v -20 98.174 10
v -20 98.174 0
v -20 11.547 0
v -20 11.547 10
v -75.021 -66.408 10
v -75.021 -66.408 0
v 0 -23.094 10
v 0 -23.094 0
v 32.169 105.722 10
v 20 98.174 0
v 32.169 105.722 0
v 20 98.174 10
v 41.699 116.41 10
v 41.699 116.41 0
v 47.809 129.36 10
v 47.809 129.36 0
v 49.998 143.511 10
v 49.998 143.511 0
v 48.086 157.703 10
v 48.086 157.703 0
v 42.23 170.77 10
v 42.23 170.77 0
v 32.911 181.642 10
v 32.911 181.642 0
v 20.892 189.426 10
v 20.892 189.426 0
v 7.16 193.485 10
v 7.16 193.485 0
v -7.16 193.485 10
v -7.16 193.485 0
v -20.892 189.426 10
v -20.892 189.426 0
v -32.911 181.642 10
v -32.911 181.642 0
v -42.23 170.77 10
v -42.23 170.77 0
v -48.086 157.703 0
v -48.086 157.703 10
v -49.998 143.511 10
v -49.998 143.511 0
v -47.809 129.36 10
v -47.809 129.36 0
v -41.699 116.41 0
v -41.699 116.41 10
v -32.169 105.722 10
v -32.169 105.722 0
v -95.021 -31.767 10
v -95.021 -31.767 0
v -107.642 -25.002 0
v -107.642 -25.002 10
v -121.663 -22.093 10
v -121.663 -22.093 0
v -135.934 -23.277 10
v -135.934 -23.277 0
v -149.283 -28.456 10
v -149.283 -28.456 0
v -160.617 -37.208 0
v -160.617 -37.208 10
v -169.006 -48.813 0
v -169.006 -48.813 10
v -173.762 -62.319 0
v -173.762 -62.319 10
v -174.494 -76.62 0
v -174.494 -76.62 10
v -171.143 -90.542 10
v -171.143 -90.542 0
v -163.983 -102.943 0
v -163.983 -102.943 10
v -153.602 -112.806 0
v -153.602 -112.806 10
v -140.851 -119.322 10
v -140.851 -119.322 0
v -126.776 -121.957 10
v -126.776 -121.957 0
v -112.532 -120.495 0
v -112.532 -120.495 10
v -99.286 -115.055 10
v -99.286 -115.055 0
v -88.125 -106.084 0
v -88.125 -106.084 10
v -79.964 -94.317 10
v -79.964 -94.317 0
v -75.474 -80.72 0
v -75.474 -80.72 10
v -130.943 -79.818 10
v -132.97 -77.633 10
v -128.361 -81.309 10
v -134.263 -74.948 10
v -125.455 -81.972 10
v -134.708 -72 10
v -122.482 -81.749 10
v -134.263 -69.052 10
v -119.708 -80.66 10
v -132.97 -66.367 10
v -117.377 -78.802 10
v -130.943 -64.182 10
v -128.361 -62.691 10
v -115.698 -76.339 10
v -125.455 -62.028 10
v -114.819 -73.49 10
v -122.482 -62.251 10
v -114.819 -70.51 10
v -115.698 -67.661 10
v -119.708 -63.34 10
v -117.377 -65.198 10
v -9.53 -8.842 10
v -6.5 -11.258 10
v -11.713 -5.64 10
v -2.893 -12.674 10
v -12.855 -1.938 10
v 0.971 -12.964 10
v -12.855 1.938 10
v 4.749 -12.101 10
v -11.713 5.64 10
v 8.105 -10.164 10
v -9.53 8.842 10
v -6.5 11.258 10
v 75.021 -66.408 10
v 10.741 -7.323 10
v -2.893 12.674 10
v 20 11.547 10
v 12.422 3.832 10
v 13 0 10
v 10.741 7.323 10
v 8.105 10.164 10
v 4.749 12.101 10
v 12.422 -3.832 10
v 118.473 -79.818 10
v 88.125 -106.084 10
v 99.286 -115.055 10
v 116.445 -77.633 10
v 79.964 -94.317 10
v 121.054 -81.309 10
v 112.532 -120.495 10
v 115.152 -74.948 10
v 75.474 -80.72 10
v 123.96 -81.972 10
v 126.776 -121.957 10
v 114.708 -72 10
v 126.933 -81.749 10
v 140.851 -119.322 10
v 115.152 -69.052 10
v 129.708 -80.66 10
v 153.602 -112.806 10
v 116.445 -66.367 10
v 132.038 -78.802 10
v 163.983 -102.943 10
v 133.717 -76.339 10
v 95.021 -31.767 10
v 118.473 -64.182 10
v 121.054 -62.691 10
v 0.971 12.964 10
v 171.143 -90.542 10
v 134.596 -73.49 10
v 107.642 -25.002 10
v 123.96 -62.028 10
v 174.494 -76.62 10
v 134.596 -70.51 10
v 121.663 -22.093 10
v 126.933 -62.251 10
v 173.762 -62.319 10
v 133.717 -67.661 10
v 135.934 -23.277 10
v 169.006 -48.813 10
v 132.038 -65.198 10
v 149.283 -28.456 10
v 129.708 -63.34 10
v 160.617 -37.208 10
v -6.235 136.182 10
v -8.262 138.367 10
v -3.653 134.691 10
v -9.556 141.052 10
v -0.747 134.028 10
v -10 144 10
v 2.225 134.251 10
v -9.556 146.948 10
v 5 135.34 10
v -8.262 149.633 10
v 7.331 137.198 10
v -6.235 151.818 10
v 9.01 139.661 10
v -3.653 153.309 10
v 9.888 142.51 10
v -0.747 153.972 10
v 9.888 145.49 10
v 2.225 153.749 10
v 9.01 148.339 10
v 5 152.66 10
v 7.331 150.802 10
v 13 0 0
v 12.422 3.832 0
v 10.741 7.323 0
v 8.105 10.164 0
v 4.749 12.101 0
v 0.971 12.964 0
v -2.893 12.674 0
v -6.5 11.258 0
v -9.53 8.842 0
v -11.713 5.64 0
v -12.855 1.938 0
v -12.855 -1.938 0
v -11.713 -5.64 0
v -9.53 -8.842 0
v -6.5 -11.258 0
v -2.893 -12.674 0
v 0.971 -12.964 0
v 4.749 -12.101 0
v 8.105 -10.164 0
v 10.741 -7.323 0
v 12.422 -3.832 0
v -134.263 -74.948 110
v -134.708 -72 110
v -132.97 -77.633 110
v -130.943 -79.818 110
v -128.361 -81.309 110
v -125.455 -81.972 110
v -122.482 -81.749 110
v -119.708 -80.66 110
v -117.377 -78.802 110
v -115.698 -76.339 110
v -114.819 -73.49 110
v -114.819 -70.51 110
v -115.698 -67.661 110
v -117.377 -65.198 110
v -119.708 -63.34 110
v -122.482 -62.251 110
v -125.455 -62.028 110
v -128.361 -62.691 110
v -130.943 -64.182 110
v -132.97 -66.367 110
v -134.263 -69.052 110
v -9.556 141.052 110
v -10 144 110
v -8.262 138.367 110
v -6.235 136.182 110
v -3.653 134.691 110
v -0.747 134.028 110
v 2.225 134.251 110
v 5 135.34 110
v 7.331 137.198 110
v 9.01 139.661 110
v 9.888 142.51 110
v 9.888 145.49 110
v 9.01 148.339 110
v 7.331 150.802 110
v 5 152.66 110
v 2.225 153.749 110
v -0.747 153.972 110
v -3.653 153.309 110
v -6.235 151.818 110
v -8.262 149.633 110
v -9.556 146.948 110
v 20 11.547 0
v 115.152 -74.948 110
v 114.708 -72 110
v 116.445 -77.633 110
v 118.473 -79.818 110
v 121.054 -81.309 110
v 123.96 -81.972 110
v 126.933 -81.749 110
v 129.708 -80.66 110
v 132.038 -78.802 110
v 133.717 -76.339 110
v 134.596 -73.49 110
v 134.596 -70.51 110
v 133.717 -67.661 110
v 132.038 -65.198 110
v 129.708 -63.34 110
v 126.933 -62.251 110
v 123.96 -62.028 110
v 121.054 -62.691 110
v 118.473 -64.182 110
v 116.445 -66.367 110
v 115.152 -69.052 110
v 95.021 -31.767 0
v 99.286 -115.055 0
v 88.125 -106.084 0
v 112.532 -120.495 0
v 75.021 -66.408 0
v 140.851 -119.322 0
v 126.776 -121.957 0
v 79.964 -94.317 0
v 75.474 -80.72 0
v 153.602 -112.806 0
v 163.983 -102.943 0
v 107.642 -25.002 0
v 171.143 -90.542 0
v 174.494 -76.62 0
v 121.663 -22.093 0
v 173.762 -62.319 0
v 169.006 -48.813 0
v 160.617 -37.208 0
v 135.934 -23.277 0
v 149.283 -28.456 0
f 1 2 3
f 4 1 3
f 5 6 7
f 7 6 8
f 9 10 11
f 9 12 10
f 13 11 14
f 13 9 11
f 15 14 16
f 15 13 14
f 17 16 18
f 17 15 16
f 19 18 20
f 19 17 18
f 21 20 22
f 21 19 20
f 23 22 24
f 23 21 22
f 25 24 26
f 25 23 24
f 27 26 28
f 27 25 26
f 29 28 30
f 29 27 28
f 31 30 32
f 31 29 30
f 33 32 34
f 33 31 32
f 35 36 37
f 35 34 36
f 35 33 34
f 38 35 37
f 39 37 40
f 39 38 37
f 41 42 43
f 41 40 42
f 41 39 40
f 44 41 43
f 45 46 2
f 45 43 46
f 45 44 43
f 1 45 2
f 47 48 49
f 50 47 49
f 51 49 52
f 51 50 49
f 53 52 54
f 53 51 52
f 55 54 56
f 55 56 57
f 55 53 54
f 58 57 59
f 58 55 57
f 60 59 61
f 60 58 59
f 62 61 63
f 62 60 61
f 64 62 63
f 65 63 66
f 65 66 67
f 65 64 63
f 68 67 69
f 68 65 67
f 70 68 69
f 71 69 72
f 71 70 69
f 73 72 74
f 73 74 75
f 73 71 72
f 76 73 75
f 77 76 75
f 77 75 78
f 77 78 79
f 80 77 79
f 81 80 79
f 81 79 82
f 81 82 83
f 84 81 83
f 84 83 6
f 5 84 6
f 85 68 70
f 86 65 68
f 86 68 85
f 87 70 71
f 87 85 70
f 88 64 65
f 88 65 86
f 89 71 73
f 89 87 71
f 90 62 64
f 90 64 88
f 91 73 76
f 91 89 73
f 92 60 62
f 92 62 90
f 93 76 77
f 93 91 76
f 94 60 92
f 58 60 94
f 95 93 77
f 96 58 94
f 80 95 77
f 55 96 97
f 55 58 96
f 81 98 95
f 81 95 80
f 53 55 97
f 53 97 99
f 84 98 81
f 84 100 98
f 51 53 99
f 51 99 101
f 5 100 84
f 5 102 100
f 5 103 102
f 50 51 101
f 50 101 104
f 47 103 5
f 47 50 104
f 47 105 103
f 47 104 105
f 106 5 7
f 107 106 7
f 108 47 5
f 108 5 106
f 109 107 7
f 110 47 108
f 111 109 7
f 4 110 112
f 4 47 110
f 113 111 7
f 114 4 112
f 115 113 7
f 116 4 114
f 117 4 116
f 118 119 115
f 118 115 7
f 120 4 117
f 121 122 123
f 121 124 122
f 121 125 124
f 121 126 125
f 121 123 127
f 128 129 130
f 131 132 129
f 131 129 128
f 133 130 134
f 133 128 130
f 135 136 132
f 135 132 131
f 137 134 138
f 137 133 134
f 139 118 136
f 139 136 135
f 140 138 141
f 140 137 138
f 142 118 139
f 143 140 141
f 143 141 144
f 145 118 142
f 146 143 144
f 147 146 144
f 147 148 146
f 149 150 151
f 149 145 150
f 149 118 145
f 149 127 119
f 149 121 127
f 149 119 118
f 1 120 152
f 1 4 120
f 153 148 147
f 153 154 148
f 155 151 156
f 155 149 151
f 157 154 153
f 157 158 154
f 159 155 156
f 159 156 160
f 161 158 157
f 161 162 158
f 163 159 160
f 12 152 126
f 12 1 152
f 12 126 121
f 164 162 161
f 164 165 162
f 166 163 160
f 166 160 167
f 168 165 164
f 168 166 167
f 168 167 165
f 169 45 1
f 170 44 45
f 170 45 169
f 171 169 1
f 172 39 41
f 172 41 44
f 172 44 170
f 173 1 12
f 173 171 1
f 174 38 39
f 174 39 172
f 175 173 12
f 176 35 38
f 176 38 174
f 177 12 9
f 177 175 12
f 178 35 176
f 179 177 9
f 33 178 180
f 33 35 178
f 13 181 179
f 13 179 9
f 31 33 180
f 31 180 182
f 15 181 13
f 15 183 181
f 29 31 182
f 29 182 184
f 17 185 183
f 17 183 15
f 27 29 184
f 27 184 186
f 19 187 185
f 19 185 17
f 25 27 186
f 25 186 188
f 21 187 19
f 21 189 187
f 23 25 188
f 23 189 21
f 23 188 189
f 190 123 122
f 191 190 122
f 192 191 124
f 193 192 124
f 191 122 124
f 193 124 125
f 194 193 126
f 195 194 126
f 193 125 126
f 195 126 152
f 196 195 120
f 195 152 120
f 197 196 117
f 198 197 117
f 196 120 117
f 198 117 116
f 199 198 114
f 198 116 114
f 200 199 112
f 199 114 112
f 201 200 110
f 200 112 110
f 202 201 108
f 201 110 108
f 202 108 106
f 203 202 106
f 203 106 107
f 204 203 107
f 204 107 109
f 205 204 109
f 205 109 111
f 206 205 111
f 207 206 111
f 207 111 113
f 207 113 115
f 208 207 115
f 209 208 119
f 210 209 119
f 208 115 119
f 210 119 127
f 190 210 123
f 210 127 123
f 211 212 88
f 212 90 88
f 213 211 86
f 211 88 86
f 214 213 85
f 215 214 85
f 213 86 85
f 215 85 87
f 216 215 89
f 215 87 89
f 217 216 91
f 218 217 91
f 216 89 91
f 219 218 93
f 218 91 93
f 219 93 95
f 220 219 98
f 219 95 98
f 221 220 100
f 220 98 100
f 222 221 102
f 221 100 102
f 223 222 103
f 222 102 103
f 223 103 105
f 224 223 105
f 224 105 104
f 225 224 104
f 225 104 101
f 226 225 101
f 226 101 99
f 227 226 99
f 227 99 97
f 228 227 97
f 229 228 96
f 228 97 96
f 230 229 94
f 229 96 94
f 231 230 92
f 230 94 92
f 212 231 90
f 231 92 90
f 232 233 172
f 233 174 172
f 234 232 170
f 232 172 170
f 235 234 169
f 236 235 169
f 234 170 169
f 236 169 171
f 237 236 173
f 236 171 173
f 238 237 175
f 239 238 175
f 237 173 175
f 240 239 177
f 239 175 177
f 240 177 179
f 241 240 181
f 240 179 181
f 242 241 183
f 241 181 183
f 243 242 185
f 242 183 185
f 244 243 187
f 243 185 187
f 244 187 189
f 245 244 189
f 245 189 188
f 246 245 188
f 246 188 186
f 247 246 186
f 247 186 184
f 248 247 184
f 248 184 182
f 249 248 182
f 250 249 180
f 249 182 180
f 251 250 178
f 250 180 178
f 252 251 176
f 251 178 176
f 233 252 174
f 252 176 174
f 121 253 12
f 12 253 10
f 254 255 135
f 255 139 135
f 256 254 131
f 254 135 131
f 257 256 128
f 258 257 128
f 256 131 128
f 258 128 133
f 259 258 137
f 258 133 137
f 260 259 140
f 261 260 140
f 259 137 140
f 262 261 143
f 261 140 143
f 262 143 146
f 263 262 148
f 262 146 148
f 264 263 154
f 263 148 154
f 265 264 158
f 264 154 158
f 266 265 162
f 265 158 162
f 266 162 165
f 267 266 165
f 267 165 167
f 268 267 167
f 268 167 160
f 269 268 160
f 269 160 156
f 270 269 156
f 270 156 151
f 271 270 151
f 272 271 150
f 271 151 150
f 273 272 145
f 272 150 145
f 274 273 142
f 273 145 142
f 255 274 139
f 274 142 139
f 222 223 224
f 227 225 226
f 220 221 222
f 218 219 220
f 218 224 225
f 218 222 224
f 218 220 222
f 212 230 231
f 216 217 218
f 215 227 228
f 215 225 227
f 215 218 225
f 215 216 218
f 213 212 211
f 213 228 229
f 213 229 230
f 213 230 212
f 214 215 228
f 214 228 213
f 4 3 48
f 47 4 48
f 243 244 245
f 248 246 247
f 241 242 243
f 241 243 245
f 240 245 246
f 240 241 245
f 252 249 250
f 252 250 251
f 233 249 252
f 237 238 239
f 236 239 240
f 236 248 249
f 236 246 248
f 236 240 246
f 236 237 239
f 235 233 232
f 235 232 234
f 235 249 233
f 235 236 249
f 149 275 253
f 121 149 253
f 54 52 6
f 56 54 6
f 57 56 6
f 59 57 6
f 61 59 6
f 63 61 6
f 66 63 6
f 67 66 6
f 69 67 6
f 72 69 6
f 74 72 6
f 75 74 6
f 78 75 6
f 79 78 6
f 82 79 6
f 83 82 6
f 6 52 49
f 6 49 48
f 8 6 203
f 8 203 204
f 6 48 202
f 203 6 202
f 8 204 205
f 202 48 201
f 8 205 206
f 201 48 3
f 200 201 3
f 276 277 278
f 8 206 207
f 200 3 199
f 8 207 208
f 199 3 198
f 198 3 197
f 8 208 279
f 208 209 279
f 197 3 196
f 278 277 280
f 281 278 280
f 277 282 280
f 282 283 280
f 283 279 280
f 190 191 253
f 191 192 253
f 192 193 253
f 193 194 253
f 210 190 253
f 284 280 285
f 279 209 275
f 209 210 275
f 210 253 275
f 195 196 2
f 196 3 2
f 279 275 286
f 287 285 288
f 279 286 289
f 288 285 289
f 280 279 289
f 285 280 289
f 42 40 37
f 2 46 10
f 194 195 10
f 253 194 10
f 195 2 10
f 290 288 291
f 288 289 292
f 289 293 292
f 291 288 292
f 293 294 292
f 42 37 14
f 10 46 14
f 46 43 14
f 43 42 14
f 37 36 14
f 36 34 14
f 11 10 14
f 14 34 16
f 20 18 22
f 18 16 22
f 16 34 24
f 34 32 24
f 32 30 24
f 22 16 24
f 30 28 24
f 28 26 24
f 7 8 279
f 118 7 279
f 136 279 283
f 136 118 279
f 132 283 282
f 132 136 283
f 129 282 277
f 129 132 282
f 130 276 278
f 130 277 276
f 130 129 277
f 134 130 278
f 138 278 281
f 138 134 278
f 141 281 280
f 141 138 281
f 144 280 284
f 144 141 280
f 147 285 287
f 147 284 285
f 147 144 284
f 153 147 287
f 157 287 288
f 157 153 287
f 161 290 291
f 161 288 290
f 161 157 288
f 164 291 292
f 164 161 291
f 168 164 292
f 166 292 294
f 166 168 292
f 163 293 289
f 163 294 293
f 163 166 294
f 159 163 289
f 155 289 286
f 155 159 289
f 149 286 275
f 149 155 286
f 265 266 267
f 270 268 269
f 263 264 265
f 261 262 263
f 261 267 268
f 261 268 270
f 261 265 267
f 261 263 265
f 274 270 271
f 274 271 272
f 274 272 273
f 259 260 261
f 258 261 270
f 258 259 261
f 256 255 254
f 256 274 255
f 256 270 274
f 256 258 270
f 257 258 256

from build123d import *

# Parameters (mm, degrees)
BOSS_EXTRUDE2_DEPTH = 10
SKETCH3_R           = 50
BOSS_EXTRUDE3_DEPTH = 10
SKETCH4_R           = 10
BOSS_EXTRUDE4_DEPTH = 90
CUT_EXTRUDE1_START  = -30
SKETCH5_R           = 10
CUT_EXTRUDE1_DEPTH  = 30
SKETCH6_R           = 13
CUT_EXTRUDE2_DEPTH  = 10
SKETCH7_R           = 10
BOSS_EXTRUDE5_DEPTH = 30
SKETCH9_R           = 10
BOSS_EXTRUDE6_DEPTH = 10
SKETCH10_R          = 10
BOSS_EXTRUDE7_DEPTH = 10
SKETCH11_R          = 10
BOSS_EXTRUDE8_DEPTH = 10


with BuildPart() as part:
    # Sketch1 → Boss-Extrude2 (new body)
    with BuildSketch(Plane.XY):
        Polygon((20, 144), (-20, 144), (-20, 11.547005384), (-134.707658145, -54.679491924), (-114.707658145, -89.320508076), (0, -23.094010768), (114.707658145, -89.320508076), (134.707658145, -54.679491924), (20, 11.547005384), align=None)
    extrude(amount=BOSS_EXTRUDE2_DEPTH)

    # Sketch3 → Boss-Extrude3 (add)
    with BuildSketch(Plane.XY.offset(10)):
        with Locations((-124.707658145, -72)):
            Circle(SKETCH3_R)
        with Locations((0, 144)):
            Circle(SKETCH3_R)
        with Locations((124.707658145, -72)):
            Circle(SKETCH3_R)
    extrude(amount=-BOSS_EXTRUDE3_DEPTH)

    # Sketch4 → Boss-Extrude4 (add)
    with BuildSketch(Plane.XY.offset(10)):
        with Locations(Location((0, 144, 0), (0, 0, 180))):
            Circle(SKETCH4_R)
        with Locations(Location((124.707658145, -72, 0), (0, 0, 180))):
            Circle(SKETCH4_R)
        with Locations(Location((-124.707658145, -72, 0), (0, 0, 180))):
            Circle(SKETCH4_R)
    extrude(amount=BOSS_EXTRUDE4_DEPTH)

    # Sketch5 → Cut-Extrude1 (cut)
    with BuildSketch(Plane.XY.offset(100).offset(CUT_EXTRUDE1_START)):
        with Locations(Location((0, 144, 0), (0, 0, 180))):
            Circle(SKETCH5_R)
    extrude(amount=CUT_EXTRUDE1_DEPTH, mode=Mode.SUBTRACT)

    # Sketch6 → Cut-Extrude2 (cut)
    with BuildSketch(Plane.XY.offset(10)):
        Circle(SKETCH6_R)
    extrude(amount=-CUT_EXTRUDE2_DEPTH, mode=Mode.SUBTRACT)

    # Sketch7 → Boss-Extrude5 (add)
    with BuildSketch(Plane.XY.offset(70)):
        with Locations(Location((0, 144, 0), (0, 0, 180))):
            Circle(SKETCH7_R)
    extrude(amount=BOSS_EXTRUDE5_DEPTH)

    # Sketch9 → Boss-Extrude6 (add)
    with BuildSketch(Plane.XY.offset(100)):
        with Locations(Location((0, 144, 0), (0, 0, 180))):
            Circle(SKETCH9_R)
    extrude(amount=BOSS_EXTRUDE6_DEPTH)

    # Sketch10 → Boss-Extrude7 (add)
    with BuildSketch(Plane.XY.offset(100)):
        with Locations(Location((-124.707658145, -72, 0), (0, 0, 180))):
            Circle(SKETCH10_R)
    extrude(amount=BOSS_EXTRUDE7_DEPTH)

    # Sketch11 → Boss-Extrude8 (add)
    with BuildSketch(Plane.XY.offset(100)):
        with Locations(Location((124.707658145, -72, 0), (0, 0, 180))):
            Circle(SKETCH11_R)
    extrude(amount=BOSS_EXTRUDE8_DEPTH)


solid = part.part
